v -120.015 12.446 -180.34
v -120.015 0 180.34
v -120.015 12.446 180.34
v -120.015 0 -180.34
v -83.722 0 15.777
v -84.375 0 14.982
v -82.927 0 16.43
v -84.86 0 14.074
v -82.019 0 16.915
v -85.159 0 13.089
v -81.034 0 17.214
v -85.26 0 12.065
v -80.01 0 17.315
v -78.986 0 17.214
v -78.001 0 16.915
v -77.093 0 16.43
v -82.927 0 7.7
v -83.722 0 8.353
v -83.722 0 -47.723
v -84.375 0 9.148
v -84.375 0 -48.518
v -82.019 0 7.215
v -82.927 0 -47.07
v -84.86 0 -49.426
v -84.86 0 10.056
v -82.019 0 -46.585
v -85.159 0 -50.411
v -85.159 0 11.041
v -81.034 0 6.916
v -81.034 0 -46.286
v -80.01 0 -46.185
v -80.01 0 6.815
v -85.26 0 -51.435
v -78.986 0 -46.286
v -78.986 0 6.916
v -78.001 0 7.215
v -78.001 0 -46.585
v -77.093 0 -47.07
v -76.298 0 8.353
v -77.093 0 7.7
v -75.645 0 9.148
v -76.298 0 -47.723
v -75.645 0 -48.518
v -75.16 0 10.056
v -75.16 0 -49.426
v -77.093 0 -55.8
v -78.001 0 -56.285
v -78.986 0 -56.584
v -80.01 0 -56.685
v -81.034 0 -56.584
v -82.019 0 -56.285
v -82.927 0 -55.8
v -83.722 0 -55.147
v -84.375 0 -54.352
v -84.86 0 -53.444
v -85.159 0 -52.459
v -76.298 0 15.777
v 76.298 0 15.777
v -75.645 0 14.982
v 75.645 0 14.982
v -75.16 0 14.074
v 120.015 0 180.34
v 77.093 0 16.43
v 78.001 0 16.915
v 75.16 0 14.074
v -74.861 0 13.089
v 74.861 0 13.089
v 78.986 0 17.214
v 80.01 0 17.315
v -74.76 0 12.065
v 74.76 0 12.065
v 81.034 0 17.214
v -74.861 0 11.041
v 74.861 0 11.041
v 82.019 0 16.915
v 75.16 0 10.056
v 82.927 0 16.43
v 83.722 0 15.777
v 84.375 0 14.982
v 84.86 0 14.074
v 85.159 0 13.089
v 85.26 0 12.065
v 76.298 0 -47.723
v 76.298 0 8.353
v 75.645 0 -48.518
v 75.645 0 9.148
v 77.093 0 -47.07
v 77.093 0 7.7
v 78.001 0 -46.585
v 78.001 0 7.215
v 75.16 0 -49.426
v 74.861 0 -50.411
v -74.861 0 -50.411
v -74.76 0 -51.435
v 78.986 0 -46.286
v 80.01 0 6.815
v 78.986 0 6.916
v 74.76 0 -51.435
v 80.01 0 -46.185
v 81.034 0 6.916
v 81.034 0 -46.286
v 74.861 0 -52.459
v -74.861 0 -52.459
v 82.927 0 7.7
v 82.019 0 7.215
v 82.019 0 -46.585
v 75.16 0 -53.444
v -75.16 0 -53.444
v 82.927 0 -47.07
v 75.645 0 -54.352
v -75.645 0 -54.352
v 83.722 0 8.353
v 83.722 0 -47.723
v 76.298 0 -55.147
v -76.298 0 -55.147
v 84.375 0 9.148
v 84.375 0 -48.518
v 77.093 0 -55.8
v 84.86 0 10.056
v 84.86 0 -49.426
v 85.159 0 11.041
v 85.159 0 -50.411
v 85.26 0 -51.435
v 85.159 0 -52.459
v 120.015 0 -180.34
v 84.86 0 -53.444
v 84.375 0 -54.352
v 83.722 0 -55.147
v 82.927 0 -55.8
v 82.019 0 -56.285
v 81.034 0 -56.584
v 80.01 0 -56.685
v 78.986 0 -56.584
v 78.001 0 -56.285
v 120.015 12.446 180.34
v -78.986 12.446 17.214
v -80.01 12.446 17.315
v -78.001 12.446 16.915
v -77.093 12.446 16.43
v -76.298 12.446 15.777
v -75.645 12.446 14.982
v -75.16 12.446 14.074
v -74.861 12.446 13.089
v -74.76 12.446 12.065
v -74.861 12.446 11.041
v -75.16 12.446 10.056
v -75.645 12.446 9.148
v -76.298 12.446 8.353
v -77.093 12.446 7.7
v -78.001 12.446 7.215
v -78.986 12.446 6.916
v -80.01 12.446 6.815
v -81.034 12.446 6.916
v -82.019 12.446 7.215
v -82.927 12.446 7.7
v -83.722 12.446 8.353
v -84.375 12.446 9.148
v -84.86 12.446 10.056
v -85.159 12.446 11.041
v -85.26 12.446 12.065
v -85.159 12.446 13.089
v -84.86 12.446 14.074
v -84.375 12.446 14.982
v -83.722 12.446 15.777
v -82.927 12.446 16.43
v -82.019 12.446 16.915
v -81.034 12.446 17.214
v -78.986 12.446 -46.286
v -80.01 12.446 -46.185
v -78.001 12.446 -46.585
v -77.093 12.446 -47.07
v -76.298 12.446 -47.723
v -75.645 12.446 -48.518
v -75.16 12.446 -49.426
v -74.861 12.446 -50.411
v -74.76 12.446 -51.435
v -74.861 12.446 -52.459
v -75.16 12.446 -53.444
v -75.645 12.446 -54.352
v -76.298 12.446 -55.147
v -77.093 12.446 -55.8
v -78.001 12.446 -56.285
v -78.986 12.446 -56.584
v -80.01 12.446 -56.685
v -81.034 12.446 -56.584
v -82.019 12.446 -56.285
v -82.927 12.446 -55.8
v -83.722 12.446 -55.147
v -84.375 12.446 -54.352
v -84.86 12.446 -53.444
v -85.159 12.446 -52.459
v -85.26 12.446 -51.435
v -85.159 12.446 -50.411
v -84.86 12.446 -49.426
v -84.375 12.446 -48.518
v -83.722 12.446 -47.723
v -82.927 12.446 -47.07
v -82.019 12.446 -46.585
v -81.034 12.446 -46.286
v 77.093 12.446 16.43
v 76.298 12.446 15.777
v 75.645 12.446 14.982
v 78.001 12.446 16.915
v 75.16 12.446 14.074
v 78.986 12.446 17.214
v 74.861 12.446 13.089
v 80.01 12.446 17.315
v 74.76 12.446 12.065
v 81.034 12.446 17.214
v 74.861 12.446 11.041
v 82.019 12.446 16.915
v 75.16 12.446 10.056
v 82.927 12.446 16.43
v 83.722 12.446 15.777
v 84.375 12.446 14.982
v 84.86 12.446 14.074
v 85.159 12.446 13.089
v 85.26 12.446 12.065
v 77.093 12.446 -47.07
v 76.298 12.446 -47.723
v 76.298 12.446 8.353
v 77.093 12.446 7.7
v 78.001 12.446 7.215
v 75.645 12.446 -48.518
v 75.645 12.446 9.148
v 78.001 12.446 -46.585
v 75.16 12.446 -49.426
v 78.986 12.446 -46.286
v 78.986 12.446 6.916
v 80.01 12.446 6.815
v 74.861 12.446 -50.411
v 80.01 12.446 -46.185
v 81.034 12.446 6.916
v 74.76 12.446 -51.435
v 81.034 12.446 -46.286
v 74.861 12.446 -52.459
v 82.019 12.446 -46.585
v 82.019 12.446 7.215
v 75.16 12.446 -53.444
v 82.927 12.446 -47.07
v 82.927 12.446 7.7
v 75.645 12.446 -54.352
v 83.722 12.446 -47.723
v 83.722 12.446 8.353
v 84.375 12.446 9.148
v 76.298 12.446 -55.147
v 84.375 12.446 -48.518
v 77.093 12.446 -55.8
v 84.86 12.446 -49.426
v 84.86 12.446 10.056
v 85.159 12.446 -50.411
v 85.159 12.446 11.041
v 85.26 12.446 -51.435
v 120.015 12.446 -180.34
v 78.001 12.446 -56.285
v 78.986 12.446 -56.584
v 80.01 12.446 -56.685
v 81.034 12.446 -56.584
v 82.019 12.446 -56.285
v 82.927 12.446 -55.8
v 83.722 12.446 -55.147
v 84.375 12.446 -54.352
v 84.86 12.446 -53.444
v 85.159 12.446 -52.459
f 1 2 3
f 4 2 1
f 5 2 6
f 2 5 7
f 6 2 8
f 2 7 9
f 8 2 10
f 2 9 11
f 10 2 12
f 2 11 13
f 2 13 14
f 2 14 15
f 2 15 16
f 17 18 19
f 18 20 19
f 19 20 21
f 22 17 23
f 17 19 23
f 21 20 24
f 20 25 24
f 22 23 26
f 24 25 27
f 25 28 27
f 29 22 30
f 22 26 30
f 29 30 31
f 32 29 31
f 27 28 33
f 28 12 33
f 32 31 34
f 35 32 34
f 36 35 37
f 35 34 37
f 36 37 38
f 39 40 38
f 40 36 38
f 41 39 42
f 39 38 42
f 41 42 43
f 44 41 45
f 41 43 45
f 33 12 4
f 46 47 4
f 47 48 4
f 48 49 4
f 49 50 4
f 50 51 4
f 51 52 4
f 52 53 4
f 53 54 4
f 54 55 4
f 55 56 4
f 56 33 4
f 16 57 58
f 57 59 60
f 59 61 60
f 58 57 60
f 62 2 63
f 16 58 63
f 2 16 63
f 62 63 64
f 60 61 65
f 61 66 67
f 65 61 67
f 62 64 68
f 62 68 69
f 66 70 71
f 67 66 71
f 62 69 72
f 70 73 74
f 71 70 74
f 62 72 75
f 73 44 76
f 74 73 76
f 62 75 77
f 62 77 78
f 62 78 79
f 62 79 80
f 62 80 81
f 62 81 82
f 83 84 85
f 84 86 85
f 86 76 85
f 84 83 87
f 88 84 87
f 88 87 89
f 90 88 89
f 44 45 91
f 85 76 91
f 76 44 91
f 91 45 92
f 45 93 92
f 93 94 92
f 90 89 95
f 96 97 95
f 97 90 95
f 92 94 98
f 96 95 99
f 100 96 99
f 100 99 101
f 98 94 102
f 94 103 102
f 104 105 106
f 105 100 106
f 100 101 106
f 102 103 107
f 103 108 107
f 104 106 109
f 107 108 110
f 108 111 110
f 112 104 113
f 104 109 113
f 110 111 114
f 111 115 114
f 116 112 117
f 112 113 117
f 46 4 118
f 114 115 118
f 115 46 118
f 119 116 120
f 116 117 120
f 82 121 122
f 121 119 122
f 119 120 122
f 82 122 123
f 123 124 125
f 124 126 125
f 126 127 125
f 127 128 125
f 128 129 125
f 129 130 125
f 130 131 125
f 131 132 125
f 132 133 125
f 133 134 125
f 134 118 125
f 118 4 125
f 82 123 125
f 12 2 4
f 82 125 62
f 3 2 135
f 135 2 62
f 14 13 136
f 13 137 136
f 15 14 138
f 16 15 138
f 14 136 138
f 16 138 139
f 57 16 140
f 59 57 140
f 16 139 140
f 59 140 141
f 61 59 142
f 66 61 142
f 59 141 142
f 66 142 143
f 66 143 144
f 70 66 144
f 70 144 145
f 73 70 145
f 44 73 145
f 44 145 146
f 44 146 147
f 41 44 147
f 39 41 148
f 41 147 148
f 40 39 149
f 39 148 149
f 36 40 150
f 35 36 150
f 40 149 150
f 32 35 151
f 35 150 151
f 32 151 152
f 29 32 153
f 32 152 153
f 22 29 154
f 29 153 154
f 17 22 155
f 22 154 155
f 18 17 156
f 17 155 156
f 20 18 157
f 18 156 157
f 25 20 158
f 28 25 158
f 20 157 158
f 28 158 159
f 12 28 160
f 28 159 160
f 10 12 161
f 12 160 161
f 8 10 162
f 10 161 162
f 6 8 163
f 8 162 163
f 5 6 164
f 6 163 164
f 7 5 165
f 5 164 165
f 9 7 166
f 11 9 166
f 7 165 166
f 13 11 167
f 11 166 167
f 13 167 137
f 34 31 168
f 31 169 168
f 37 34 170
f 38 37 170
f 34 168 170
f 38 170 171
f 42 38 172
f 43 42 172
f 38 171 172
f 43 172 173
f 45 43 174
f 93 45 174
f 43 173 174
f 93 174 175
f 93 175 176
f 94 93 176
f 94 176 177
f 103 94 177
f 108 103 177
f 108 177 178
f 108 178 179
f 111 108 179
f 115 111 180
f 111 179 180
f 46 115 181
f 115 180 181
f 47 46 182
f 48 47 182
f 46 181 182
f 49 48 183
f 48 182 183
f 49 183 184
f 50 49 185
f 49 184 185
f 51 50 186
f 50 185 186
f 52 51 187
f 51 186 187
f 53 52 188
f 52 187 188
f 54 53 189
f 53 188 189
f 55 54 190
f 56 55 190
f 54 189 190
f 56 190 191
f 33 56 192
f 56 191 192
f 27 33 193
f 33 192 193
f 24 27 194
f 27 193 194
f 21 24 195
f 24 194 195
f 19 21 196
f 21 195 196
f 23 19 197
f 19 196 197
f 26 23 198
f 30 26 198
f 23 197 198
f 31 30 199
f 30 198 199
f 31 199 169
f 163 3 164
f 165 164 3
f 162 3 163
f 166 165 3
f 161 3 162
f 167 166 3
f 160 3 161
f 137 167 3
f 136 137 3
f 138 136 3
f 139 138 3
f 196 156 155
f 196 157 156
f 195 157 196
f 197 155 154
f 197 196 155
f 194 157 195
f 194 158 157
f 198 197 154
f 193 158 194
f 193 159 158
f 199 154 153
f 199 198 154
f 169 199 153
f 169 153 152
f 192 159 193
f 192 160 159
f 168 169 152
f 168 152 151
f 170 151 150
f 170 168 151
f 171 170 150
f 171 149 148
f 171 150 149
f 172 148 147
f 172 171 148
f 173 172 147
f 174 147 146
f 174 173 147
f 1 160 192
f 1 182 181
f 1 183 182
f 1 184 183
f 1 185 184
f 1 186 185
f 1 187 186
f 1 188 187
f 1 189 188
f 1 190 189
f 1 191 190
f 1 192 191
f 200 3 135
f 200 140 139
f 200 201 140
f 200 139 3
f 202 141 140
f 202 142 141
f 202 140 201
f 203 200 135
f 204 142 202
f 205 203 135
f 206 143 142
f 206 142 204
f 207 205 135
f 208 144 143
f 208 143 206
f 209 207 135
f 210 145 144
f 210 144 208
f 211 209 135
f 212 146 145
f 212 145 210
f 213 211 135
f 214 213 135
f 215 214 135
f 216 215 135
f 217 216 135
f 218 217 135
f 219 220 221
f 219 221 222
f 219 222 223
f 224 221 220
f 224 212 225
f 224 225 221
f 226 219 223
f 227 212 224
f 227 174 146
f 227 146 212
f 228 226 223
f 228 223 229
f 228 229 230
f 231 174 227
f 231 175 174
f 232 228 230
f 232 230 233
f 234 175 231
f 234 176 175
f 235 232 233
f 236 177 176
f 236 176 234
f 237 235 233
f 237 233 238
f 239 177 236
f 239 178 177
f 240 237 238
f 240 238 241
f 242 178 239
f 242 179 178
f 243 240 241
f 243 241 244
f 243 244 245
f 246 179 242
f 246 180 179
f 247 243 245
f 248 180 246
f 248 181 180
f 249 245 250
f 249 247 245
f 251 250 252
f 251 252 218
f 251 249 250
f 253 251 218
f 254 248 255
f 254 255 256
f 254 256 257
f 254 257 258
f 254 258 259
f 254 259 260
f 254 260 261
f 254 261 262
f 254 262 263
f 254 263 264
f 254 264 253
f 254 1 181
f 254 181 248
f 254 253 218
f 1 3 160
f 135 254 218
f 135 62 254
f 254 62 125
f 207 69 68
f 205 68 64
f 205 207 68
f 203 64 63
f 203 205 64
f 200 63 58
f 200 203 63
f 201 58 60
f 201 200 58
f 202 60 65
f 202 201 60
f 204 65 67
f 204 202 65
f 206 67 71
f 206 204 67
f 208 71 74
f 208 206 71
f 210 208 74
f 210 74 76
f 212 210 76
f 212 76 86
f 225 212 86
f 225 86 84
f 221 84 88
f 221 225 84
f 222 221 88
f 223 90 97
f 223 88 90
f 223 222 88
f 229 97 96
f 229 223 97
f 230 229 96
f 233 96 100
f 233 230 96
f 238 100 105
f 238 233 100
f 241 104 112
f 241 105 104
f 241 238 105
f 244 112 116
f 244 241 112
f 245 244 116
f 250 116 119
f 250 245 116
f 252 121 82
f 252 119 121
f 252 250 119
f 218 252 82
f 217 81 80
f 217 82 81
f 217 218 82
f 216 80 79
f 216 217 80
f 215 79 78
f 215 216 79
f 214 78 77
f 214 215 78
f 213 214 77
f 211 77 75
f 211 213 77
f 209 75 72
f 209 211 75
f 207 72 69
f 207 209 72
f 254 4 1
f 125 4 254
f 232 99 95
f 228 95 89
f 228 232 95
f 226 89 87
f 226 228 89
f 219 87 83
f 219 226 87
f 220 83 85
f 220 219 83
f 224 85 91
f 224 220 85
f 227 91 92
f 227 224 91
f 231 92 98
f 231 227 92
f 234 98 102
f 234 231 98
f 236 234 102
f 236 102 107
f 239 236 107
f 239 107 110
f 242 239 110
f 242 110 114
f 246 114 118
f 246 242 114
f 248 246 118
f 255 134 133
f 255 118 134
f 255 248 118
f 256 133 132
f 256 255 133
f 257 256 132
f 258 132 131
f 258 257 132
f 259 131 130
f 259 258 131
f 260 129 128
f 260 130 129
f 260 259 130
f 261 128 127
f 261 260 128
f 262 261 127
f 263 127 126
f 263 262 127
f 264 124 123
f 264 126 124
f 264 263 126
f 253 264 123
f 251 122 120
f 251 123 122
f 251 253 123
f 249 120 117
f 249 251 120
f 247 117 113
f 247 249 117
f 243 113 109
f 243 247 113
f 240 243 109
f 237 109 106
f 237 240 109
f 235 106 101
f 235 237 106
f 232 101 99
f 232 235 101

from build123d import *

# Parameters (mm, degrees)
SKETCH1_W                              = 240.03
SKETCH1_H                              = 360.68
BOSS_EXTRUDE1_DEPTH                    = 12.446
TAP_DRILL_FOR_M10_HELICOIL1_AT_2_COUNT = 2
TAP_DRILL_FOR_M10_HELICOIL1_AT_2_PITCH = 63.5


with BuildPart() as part:
    # Sketch1 → Boss-Extrude1 (new body)
    with BuildSketch(Plane(origin=(0, 0, 0), x_dir=(1, 0, 0), z_dir=(0, 1, 0))):
        Rectangle(SKETCH1_W, SKETCH1_H)
    extrude(amount=BOSS_EXTRUDE1_DEPTH)

    # Sketch4 → Tap Drill for M10 Helicoil1 (revolve, cut)
    with BuildSketch(Plane(origin=(80.01, 12.446, -51.435), x_dir=(0, 0, 1), z_dir=(1, 0, 0))):
        Polygon((0, 0), (0, 28.15451905), (5.25, 25.0000008), (5.25, 0), align=None)
    tap_drill_for_m10_helicoil1 = revolve(axis=Axis((80.01, 18.796, -51.435), (0, -1, 0)), mode=Mode.SUBTRACT)

    # Tap Drill for M10 Helicoil1 at 2: Tap Drill for M10 Helicoil1 ×2
    with Locations(*[(0, 0, i * TAP_DRILL_FOR_M10_HELICOIL1_AT_2_PITCH) for i in range(1, TAP_DRILL_FOR_M10_HELICOIL1_AT_2_COUNT)]):
        add(tap_drill_for_m10_helicoil1, mode=Mode.SUBTRACT)

    # Mirror1: Tap Drill for M10 Helicoil1 across plane
    add(tap_drill_for_m10_helicoil1.mirror(Plane.ZY), mode=Mode.SUBTRACT)

    # Mirror1 copy 1 sketch → Mirror1 copy 1 (revolve, cut)
    with BuildSketch(Plane(origin=(-80.01, 12.446, 12.065), x_dir=(0, 0, 1), z_dir=(-1, 0, 0))):
        Polygon((0, 0), (0, -28.15451905), (5.25, -25.0000008), (5.25, 0), align=None)
    revolve(axis=Axis((-80.01, 18.796, 12.065), (0, 1, 0)), mode=Mode.SUBTRACT)


solid = part.part
